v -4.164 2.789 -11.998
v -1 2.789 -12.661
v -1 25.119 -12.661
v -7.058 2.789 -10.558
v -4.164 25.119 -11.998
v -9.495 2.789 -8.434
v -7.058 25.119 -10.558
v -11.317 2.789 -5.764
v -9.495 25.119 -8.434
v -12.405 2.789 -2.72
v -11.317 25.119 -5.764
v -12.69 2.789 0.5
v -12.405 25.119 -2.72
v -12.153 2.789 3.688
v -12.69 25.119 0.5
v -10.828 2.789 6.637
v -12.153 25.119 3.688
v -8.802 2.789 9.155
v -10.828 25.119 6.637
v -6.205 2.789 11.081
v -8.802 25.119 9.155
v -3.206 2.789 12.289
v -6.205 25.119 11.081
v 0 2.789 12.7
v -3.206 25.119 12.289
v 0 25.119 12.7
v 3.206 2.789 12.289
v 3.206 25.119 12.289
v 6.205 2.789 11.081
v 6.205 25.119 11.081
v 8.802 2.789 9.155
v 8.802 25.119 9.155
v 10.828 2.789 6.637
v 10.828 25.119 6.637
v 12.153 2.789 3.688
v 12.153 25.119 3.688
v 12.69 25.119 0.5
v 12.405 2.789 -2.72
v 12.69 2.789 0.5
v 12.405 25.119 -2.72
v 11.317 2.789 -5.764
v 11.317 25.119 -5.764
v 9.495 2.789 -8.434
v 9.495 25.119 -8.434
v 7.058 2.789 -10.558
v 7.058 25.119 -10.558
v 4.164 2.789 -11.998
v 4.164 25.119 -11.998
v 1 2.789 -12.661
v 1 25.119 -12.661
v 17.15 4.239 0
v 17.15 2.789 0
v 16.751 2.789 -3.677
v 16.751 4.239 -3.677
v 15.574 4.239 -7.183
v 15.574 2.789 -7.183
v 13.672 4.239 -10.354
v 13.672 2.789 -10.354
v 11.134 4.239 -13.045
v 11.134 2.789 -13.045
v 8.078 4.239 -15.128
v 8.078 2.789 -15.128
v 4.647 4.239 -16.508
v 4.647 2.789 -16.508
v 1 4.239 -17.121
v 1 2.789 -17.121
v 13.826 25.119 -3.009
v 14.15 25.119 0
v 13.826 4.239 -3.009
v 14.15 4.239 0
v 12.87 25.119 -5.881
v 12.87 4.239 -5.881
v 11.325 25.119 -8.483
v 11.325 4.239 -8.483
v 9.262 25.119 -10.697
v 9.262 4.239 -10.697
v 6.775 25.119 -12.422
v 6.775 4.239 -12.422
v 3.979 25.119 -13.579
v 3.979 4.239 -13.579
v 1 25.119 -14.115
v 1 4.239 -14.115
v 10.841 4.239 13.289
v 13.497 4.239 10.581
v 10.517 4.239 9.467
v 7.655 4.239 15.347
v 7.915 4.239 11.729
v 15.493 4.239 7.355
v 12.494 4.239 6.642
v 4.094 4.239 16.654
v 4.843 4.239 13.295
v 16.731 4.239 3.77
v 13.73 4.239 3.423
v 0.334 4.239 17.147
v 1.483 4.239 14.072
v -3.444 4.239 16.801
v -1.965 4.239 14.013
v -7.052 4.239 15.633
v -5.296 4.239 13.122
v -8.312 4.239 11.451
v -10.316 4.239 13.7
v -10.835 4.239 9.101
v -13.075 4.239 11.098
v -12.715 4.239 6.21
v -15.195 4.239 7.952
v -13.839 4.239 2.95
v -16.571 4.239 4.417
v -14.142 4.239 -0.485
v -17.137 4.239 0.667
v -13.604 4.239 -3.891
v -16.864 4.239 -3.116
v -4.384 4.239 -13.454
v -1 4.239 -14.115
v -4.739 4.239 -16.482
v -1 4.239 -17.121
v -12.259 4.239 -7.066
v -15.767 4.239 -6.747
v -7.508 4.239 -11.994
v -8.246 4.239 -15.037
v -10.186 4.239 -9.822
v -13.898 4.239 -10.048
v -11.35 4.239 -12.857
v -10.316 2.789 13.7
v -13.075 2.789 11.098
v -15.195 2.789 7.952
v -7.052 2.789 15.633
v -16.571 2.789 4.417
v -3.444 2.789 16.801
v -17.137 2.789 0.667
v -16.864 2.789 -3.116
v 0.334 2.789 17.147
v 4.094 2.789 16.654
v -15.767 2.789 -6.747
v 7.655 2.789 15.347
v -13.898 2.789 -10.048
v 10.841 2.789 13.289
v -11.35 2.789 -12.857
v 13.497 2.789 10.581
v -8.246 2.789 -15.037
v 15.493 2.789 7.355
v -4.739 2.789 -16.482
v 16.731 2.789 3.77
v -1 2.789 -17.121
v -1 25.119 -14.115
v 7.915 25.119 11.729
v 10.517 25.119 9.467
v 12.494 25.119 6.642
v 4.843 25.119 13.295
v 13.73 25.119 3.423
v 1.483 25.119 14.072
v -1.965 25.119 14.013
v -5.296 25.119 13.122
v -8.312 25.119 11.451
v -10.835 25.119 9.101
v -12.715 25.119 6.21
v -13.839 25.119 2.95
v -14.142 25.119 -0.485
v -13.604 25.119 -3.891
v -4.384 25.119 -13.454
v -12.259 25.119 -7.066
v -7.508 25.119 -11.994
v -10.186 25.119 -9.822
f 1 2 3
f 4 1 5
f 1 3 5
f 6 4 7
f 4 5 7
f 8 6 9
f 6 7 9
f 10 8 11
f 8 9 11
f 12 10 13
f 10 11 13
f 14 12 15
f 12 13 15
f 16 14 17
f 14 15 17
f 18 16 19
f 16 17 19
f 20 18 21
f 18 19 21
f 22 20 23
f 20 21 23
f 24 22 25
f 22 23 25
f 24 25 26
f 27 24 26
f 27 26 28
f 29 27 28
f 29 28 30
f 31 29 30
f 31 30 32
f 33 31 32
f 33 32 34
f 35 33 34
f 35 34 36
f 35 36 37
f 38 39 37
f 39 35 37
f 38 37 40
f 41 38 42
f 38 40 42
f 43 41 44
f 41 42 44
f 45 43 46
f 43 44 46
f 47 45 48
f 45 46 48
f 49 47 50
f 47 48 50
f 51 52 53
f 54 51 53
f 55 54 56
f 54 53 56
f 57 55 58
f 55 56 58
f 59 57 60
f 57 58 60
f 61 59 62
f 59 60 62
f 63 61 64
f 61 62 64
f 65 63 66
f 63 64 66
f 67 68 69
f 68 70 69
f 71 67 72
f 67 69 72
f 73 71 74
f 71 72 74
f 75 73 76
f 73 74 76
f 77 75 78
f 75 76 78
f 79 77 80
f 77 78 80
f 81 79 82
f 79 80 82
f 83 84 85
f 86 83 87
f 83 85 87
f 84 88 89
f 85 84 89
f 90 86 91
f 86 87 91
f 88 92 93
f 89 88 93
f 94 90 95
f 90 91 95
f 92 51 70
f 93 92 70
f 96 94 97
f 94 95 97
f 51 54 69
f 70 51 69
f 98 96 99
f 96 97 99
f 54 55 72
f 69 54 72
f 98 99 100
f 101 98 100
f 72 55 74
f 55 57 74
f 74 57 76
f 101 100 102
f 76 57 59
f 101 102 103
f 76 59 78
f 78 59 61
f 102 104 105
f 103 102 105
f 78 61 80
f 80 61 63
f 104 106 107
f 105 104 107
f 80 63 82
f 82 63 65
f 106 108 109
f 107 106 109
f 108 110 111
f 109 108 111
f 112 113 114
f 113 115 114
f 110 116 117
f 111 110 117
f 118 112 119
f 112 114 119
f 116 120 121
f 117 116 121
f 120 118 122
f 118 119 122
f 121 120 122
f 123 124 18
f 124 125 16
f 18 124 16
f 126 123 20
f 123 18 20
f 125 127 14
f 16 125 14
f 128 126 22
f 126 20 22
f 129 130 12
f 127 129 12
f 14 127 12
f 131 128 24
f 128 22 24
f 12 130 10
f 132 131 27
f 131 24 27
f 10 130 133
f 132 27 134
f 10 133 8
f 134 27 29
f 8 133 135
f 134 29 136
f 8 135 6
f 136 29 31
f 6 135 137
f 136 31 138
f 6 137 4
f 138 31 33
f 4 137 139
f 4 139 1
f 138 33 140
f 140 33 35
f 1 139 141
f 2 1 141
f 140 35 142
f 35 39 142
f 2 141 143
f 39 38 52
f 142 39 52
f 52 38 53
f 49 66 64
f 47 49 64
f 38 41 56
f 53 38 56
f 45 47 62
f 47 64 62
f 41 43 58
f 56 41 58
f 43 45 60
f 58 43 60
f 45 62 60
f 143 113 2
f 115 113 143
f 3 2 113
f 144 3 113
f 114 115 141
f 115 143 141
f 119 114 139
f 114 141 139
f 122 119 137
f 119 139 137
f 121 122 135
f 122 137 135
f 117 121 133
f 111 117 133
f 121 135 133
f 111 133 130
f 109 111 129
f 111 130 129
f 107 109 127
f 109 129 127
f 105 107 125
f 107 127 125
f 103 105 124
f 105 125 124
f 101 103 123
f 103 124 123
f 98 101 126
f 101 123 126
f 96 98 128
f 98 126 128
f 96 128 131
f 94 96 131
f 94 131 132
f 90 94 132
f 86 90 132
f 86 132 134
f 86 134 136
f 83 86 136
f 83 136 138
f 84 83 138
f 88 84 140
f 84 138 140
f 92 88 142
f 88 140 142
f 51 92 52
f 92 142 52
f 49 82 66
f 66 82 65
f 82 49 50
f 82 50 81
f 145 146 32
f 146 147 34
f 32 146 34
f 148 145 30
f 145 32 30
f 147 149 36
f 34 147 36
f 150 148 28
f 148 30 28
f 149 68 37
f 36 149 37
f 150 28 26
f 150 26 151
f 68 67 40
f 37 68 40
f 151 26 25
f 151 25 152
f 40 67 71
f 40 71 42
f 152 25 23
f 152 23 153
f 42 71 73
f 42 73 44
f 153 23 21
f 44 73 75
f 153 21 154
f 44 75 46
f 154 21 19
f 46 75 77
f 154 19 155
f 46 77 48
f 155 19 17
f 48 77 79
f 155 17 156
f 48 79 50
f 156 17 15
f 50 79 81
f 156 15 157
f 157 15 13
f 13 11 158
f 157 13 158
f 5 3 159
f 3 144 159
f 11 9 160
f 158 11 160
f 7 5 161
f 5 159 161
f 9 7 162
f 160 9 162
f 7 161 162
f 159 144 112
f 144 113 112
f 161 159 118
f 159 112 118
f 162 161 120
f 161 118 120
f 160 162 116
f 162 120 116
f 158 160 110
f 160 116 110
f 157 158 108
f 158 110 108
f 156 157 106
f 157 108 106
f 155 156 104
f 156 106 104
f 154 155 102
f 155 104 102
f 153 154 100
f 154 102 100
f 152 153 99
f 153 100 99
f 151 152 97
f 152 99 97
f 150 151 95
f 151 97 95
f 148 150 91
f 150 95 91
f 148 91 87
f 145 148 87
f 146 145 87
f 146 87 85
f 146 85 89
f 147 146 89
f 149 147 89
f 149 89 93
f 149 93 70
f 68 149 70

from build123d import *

# Parameters (mm, degrees)
SKETCH2_W          = 2
SKETCH2_H          = 66.093473653
CUT_EXTRUDE1_DEPTH = 23.33


with BuildPart() as part:
    # Sketch1 → Revolve1 (revolve)
    with BuildSketch(Plane.XY):
        Polygon((12.7, 2.789418738), (12.7, 25.119418738), (14.15, 25.119418738), (14.15, 4.239418738), (17.15, 4.239418738), (17.15, 2.789418738), align=None)
    revolve(axis=Axis((0, 0, 0), (0, 1, 0)))

    # Sketch2 → Cut-Extrude1 (cut, through all)
    with BuildSketch(Plane(origin=(0, 25.119418738, 0), x_dir=(1, 0, 0), z_dir=(0, 1, 0))):
        with Locations((0, 26.994107081)):
            Rectangle(SKETCH2_W, SKETCH2_H)
    extrude(amount=-CUT_EXTRUDE1_DEPTH, mode=Mode.SUBTRACT)


solid = part.part
